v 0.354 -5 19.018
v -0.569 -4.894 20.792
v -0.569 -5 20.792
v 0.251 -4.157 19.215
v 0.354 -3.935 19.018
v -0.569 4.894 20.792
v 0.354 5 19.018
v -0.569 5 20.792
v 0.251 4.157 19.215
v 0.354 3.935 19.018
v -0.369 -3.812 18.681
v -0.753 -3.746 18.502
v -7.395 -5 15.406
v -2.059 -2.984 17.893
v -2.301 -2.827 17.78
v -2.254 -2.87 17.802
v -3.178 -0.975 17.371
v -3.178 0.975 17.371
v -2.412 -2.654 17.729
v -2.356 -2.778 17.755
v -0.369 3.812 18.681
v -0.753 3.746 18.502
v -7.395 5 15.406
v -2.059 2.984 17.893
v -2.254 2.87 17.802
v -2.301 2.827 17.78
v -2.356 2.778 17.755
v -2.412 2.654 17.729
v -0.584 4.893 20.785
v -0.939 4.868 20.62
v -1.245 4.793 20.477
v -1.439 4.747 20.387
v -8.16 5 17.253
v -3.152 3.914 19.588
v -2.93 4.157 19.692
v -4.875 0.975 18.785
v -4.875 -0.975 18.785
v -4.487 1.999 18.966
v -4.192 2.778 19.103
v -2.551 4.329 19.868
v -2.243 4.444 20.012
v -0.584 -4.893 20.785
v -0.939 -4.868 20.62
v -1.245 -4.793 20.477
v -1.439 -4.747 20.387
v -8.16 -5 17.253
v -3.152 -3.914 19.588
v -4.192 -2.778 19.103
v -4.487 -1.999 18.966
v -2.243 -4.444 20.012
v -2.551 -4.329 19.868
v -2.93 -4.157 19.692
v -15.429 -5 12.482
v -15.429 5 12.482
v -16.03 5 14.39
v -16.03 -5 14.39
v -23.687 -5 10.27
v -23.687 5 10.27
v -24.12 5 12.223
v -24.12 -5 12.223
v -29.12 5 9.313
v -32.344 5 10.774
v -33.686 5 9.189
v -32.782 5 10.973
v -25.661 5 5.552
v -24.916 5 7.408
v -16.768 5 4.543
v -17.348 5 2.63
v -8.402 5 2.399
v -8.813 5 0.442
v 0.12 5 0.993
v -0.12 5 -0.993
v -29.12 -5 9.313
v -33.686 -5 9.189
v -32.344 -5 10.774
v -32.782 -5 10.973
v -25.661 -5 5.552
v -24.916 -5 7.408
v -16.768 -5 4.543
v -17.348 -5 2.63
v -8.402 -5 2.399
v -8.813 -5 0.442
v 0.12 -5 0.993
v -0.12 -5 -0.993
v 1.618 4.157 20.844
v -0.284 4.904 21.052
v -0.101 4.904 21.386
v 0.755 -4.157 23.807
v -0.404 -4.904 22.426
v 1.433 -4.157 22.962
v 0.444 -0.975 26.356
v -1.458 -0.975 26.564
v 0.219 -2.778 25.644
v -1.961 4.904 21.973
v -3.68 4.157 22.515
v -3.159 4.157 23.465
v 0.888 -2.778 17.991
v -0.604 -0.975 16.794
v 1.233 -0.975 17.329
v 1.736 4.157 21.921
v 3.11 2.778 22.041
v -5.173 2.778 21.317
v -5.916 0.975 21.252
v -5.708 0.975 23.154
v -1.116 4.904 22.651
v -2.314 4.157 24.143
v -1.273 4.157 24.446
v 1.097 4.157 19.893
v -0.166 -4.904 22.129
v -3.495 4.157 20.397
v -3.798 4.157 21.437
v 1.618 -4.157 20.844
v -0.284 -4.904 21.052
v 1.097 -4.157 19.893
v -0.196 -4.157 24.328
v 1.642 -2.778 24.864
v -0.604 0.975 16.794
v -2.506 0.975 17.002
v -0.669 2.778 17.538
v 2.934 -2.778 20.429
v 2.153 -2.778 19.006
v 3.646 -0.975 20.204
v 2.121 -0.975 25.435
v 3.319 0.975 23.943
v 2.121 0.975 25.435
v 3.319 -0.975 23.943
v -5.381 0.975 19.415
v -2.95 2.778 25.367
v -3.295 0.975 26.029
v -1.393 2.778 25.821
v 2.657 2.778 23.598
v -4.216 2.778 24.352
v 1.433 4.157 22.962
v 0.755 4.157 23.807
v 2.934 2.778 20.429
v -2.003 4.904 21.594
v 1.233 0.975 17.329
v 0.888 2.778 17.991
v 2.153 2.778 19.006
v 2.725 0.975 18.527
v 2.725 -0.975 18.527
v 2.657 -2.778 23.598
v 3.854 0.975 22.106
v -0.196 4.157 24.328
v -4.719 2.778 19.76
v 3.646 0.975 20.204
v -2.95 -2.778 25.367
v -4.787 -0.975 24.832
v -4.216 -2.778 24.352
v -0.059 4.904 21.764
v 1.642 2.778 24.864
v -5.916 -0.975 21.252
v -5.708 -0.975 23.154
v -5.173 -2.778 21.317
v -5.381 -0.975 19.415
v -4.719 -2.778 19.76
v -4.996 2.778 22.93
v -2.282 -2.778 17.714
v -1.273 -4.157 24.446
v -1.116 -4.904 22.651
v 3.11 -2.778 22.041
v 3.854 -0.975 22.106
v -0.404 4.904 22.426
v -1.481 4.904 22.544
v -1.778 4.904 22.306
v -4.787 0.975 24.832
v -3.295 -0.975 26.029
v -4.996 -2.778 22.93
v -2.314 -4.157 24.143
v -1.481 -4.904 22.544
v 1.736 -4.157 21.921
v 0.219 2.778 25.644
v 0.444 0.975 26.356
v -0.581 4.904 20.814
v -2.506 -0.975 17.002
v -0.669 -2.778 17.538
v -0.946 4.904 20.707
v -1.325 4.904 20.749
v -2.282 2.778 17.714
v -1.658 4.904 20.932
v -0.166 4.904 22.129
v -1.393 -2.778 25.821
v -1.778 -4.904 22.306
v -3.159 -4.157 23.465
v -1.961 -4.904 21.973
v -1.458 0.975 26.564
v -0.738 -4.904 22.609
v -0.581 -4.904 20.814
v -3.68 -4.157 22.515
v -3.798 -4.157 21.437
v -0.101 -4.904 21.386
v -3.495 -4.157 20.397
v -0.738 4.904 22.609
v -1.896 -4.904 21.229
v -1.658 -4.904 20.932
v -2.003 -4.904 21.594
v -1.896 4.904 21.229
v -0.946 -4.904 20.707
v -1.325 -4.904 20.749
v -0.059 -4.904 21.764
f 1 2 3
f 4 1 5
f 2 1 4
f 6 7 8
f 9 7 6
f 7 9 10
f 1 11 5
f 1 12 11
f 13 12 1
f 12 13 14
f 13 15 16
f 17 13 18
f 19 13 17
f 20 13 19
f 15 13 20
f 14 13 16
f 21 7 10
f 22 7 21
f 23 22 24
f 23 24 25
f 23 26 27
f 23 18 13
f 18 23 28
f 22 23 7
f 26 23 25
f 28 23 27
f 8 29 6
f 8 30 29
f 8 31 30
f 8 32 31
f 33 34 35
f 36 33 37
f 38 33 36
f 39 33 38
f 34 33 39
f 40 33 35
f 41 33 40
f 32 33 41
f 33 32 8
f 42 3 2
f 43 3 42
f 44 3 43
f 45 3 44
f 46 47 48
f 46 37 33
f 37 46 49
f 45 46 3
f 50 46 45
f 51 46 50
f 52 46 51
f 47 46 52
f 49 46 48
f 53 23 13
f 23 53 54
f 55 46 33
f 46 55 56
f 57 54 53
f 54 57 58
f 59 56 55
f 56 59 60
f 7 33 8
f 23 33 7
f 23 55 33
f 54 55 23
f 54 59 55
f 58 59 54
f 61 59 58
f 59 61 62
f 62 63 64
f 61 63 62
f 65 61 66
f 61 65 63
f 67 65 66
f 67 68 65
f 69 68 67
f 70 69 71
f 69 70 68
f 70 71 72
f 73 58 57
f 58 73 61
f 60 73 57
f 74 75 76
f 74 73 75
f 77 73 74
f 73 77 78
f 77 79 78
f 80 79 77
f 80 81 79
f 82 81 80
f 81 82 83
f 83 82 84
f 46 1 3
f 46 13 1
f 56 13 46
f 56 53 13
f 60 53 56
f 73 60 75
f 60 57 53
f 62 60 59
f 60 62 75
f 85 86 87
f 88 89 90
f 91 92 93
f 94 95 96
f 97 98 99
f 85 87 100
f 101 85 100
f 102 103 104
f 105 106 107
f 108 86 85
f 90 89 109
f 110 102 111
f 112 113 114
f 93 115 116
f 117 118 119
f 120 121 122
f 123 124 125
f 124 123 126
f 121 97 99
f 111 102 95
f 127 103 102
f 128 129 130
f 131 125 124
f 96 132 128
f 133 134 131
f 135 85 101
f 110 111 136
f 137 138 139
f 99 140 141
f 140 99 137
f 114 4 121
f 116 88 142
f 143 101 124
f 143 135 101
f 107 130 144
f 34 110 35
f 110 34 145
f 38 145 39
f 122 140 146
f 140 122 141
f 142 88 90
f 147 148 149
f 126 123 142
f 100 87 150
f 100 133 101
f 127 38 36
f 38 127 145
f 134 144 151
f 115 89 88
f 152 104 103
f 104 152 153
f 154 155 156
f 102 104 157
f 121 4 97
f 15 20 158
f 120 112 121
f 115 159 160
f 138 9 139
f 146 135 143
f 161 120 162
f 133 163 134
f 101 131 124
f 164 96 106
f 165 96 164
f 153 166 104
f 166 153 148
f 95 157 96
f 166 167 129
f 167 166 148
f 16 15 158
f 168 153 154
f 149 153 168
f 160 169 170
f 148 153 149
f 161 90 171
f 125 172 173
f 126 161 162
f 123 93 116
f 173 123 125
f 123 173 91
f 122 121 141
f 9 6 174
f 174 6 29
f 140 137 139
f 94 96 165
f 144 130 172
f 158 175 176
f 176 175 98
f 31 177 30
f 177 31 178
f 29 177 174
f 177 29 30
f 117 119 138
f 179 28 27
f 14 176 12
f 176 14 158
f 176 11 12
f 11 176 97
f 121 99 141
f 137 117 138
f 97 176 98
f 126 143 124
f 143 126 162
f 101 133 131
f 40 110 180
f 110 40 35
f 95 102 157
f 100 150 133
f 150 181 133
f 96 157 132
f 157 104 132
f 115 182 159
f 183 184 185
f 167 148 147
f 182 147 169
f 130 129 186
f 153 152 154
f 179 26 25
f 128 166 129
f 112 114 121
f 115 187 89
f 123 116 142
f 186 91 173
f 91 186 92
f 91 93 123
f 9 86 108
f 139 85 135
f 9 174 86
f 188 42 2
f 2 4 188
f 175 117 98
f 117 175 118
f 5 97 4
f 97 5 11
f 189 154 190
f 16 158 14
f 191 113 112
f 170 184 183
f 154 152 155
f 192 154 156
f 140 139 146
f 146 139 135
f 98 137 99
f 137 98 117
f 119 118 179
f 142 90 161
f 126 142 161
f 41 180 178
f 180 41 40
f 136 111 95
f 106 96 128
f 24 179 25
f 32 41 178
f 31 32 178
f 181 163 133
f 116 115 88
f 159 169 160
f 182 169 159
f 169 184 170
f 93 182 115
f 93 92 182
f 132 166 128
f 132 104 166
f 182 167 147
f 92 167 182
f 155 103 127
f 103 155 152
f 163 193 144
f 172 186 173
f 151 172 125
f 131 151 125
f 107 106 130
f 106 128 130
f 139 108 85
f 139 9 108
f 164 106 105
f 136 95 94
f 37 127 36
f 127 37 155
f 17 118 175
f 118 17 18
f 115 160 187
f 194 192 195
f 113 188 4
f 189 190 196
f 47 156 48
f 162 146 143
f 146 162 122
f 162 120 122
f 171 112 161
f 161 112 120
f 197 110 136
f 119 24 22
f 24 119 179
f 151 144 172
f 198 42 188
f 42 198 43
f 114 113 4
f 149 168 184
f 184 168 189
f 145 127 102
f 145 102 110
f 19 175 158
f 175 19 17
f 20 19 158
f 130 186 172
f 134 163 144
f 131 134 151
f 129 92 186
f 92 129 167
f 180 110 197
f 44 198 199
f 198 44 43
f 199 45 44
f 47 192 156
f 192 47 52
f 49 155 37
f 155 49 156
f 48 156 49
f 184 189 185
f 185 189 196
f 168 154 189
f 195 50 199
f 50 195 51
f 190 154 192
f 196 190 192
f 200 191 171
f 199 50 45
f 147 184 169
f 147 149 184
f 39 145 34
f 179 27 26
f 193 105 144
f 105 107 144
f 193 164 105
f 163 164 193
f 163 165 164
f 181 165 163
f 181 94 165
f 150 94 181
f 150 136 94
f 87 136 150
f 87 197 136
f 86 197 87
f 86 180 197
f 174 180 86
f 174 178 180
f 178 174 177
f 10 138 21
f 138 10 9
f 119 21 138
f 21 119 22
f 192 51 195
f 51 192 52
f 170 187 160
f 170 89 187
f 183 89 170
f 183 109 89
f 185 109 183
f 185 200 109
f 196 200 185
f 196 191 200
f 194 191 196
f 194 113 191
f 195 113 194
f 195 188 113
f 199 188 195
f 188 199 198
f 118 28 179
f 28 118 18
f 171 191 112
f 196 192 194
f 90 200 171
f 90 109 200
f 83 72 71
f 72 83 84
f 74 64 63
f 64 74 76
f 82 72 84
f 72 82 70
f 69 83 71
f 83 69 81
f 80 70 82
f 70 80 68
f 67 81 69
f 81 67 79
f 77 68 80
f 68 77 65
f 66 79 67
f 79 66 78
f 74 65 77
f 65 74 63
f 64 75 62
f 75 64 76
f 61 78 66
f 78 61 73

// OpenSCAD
mn=20;


lift(tan(rnd(mn*360))*20);



module lift(a){
   color("red")       
    
    rotate([0,a/5,0])
{ translate([0,0,100])rotate([-90,0,0])rotate([0,0,mn/2]) arc(100,mn );} 

   color("blue") 





{   rotate([0,a/5,0]) translate([0,0,97])rotate([0,mn,0])translate([0,0,-97])   rotate([0,-a,0])translate([0,0,97]) rotate([0,0,0])rotate([-90,0,0]){
    rotate([0,0,-mn/2])  arc(97,mn );
    rotate([0,0,-mn ])  translate([0,95,0])sphere(5);
    
    }} 
    
}
module arc(r,a){
  color("yellow")  rotate([0,0,(90-(a/2))])
    rotate_extrude (angle=a,$fa=5)   {translate([r,0,0]) square([2,10],center=true);}}
    
    
    function lerp(start, end, bias) = (end * bias + start * (1 - bias));
function v3(p) = [p.x,p.y,p.z]; // vec3 formatter
function un(v)=assert (is_list(v)) v/max(norm(v),1e-64) ;
function rndc(a = 1,b = 0,s = [])=[rnd(a,b,s),rnd(a,b,s),rnd(a,b,s)];
function rnd(a = 1,b = 0,s = []) =
s == []?(rands(min(a,b),max(a,b),1)[0]) :(rands(min(a,b),max(a,b),1,s)[0]);

function bbox(v)=
let(x=[for(i=v)i.x],y=[for(i=v)i.y],z=[for(i=v)i.z])
[[min(x),min(y),min(z)],[max(x),max(y),max(z)]];


function roundlist(v,r = 0.01) = is_num(v) ? v - (v % r) : len(v) == 0 ? [] : [
  for (i = v) roundlist(i,r)];
      
 
